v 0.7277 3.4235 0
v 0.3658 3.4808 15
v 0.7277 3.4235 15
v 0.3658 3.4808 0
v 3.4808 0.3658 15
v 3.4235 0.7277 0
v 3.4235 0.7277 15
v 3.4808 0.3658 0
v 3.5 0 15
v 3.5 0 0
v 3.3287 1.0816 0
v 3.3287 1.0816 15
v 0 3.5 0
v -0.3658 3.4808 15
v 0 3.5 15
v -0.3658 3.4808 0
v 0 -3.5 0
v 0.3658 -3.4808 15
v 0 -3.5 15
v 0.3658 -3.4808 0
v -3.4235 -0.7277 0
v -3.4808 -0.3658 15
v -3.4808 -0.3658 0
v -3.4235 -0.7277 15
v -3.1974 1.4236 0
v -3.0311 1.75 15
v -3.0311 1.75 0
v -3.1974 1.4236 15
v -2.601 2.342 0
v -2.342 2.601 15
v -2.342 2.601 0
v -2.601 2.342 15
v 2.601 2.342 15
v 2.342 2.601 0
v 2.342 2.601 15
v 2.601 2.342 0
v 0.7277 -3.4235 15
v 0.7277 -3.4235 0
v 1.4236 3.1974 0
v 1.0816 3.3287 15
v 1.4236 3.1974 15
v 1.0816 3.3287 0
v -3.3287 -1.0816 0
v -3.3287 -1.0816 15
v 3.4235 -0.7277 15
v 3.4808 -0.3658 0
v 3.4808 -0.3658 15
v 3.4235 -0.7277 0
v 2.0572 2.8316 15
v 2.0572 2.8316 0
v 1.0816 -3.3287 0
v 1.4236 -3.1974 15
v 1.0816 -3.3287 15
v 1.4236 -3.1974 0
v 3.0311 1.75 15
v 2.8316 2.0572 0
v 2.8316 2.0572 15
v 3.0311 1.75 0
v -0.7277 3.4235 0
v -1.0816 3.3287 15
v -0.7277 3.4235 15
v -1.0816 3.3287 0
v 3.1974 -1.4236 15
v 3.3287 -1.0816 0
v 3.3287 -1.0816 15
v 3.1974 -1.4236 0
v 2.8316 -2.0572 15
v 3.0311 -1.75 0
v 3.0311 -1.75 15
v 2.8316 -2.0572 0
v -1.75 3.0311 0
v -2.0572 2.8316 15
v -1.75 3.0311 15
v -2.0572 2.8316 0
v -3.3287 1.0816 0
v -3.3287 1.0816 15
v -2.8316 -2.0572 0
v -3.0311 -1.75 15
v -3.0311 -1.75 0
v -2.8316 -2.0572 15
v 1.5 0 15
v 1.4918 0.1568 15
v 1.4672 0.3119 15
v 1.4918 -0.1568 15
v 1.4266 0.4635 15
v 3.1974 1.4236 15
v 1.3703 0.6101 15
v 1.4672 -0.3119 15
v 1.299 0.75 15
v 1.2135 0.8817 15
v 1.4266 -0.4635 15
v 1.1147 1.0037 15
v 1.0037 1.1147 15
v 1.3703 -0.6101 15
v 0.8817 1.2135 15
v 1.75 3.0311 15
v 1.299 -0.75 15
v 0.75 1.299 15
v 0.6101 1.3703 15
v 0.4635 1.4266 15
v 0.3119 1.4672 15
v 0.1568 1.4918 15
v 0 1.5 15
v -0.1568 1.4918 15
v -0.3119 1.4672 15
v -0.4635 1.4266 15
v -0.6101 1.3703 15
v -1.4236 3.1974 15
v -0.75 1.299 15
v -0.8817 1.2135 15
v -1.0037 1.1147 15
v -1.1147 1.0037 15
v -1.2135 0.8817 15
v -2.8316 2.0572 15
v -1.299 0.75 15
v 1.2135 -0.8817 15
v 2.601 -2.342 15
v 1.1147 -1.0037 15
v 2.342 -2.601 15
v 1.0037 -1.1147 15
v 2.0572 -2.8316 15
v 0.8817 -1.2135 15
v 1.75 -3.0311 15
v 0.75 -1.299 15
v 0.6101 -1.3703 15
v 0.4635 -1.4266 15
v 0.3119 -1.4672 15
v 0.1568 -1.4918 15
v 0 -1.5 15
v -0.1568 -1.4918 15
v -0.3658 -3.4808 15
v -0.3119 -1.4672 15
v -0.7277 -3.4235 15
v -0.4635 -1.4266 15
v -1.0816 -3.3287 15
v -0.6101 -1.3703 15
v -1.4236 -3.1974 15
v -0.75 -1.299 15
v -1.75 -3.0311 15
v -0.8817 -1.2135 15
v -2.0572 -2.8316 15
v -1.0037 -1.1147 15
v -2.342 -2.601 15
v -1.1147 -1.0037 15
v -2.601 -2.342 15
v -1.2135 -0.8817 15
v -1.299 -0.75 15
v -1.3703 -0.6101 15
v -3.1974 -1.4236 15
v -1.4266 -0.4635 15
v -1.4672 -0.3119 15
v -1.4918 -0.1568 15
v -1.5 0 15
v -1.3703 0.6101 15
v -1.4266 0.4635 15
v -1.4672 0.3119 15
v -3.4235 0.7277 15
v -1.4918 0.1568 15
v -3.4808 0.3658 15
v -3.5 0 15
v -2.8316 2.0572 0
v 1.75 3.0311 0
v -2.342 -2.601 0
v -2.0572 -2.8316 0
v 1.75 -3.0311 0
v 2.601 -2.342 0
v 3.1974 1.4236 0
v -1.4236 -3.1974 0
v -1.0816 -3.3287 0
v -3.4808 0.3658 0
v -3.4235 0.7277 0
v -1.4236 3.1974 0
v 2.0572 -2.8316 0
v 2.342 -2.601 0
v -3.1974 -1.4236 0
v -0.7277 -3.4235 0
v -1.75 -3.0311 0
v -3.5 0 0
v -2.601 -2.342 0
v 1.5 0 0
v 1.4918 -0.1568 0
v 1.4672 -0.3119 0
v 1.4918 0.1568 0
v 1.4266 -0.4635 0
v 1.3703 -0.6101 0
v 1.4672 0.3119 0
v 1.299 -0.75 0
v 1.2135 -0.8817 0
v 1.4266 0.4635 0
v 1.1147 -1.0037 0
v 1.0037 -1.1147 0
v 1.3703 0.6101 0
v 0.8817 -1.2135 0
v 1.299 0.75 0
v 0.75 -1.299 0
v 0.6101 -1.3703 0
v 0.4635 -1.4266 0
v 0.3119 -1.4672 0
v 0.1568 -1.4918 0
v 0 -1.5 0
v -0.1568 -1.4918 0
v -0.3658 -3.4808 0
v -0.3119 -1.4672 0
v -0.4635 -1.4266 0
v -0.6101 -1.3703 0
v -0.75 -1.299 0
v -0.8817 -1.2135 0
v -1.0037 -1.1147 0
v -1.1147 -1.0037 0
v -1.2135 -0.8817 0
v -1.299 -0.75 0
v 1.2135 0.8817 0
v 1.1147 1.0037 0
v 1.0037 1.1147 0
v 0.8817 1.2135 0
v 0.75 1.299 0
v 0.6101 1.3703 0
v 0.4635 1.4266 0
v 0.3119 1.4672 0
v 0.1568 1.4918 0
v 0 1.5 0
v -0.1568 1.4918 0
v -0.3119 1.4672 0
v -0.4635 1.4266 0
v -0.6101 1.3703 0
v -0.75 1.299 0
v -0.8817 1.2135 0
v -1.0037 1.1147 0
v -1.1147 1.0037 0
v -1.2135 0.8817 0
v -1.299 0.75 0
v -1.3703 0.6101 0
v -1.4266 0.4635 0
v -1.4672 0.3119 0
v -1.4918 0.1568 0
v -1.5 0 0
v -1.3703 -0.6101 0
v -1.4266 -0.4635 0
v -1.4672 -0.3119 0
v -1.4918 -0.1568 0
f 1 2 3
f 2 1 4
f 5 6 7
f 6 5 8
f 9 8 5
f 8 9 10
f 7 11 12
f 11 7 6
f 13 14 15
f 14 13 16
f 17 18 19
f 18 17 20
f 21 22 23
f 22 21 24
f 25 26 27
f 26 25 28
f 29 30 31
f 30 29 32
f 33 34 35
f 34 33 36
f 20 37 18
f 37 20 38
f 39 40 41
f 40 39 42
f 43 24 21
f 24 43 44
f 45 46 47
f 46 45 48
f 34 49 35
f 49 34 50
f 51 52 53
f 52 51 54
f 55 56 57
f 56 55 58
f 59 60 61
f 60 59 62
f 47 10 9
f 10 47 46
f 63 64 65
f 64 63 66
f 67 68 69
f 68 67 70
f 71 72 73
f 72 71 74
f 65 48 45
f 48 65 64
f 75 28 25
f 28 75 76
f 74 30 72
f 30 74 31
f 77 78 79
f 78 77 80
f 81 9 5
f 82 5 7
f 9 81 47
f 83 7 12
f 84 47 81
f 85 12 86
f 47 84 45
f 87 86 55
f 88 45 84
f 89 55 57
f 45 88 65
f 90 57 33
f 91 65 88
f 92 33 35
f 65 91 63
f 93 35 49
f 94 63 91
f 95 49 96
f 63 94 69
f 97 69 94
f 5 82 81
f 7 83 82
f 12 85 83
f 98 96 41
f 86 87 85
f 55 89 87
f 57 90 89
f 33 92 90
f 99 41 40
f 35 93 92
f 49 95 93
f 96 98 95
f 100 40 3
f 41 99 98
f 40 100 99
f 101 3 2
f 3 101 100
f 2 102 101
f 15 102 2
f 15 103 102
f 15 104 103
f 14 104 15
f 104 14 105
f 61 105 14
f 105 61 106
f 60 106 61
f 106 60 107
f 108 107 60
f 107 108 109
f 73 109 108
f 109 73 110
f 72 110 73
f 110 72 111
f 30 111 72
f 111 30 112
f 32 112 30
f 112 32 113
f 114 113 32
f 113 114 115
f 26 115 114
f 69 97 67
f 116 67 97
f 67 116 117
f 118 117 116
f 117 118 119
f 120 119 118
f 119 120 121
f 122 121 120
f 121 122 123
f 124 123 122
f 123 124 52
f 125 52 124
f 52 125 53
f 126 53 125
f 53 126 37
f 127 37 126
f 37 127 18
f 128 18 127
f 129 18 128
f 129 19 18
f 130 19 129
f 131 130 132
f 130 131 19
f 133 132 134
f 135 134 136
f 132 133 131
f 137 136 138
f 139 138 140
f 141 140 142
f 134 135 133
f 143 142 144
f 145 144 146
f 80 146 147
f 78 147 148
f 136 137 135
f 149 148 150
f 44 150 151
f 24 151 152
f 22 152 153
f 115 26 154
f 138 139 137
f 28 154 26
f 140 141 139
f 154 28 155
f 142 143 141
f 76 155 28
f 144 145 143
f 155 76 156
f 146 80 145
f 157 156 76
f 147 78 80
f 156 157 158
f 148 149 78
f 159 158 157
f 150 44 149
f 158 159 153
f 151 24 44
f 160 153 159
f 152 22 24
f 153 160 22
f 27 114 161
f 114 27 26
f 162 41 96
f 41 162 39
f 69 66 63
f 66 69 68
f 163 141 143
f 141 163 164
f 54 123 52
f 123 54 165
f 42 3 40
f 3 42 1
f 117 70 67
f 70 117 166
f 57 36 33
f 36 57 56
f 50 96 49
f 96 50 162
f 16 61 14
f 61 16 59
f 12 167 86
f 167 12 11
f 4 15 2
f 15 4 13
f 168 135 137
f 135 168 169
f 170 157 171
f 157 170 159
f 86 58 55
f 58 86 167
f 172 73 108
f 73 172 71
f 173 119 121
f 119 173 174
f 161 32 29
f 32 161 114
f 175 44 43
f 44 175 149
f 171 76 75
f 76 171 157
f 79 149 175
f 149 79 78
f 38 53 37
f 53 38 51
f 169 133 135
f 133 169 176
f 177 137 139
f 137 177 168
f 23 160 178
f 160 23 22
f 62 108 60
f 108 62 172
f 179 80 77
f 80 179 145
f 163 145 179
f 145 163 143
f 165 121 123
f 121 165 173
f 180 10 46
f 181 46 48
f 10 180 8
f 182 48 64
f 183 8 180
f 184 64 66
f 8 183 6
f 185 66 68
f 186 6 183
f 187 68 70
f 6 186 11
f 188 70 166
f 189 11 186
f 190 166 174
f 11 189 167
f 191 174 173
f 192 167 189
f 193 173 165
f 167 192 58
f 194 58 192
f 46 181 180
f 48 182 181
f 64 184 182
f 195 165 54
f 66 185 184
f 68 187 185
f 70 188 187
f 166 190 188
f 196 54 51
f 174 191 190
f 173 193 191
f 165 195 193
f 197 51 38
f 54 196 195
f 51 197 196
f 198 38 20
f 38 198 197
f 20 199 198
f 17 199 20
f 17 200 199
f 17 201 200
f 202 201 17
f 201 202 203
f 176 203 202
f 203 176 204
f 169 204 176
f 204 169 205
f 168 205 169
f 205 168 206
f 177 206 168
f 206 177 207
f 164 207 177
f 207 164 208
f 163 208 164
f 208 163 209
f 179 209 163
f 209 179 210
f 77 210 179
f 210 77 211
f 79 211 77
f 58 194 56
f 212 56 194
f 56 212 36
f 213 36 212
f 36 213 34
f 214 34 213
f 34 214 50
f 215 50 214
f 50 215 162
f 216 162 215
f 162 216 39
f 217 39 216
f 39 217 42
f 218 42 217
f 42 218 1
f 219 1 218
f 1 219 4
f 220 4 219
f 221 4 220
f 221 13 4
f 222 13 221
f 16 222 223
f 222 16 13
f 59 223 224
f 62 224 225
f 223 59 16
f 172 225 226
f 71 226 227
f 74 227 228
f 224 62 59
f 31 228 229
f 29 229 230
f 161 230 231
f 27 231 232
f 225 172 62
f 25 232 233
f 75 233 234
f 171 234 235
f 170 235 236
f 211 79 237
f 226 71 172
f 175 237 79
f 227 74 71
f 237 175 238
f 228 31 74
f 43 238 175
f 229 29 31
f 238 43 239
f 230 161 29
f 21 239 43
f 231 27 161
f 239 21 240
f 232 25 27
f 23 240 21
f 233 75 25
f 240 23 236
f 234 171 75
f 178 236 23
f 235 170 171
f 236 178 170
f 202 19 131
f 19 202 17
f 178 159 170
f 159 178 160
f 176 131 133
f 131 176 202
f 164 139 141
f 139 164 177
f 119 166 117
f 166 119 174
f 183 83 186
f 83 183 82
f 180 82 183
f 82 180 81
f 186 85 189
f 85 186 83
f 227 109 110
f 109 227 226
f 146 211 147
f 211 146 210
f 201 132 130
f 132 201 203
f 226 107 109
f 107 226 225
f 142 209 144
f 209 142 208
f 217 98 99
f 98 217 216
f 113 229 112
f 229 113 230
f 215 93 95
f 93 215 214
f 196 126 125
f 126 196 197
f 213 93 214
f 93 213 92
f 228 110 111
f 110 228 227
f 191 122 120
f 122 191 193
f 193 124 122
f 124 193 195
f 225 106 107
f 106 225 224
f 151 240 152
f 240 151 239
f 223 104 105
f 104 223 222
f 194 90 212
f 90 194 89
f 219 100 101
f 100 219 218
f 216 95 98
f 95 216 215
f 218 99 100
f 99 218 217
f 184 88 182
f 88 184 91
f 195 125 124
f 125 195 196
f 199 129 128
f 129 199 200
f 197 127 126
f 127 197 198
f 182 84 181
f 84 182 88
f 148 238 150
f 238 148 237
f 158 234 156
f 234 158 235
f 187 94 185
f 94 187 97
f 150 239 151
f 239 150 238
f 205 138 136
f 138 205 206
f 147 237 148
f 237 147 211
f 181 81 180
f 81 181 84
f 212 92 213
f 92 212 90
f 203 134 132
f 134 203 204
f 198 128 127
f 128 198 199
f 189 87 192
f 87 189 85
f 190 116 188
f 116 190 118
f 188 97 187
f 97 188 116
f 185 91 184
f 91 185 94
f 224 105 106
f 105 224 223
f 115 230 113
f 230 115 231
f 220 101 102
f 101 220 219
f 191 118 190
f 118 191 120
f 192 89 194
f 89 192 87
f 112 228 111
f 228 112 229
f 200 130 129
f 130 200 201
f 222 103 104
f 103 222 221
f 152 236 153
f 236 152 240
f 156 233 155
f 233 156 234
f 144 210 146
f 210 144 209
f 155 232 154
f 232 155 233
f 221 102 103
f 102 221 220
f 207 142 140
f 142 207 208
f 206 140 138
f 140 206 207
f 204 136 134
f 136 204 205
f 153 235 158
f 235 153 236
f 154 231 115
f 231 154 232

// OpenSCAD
/**
 * Copyright (c) 2026 Mortara Limited
 * Daniel Mortara <daniel.mortara@gmail.com>
 * 2026-07-10
 *
 * A simple jig to test the magnet sensor range.
 * A holow cylinder in the z axis holding the sensor
 * A holow bigger cylinder in the z axis which holds the magnets on the Y axis 
 * symetrically appart from the senso 
 */ 


//render_part = "all";
//render_part = "magnet_carrier";
render_part = "sensor_carrier";

// --- Sensor package dimensions (ALS31001LUAA) ---
sensor_z_sz = 4.0; // In mm
sensor_x_sz = 3.0;
sensor_y_sz = 1.5;

// --- magnets size (a cylinder)---
magnet_radius = 3.0; // mm
magnet_height = 3.0; // mm


// Sizes for the sensor carrier
sensor_carrier_inner_radius = sensor_x_sz/2.0;
sensor_carrier_outer_radius = sensor_x_sz/2.0+2.0;

// Size of magnet carrier
magnet_carrier_inner_radius = sensor_carrier_outer_radius+0.1;
magnet_carrier_outer_radius = sensor_carrier_outer_radius+0.1 + magnet_height + 2.0;
magnet_carrier_height = magnet_radius*2.0 + 4.0;

sensor_carrier_height = magnet_carrier_height+5.0;

$fn = 60;

/**
 * Sensor container (a small rod)
 */
module sensor_carrier() {
  difference() {
    cylinder(d=sensor_carrier_outer_radius*2.0, h= sensor_carrier_height);
    translate([0,0,-0.1])
    cylinder(d=sensor_carrier_inner_radius*2.0, h= sensor_carrier_height+0.2);
    //translate([0,0,2.0+sensor_z_sz])
    //cylinder(d=sensor_carrier_inner_radius*2.0+1, h= sensor_carrier_height+0.1);
  }
}

/**
 * magnets container (a small cilinder)
 * with a hole in the Z axis where the sensor will go
 * Another hole in the y axis orthogonal to the sensor hole to put two magnets
 */
module magnet_carrier() {
  difference() {
    // Shape here ...
    cylinder(d=magnet_carrier_outer_radius*2.0, h= magnet_carrier_height);
    translate([0, 0, -0.1]) // So the hole goes a bit beyon the botom of the magnet carrier
    cylinder(d=magnet_carrier_inner_radius*2.0, h= magnet_carrier_height+0.2);
    // ... minus all that follows after:
    // Magnets holes. 
    // Sequence is appyied in reverse order as with OpenGL
    translate([0, 0, magnet_radius+2.0])
    translate([0, magnet_carrier_outer_radius, 0])
    rotate([90,0,0])
    cylinder(d=magnet_radius*2.0,h=magnet_carrier_outer_radius*2.0);

    // Two sligly bigger holes to insert the magnet from the outside
    // with a small groom to kipt it in place
    groove = 0.2; // In mm for holding the manget
    for(i=[-1:2:1])
      translate([0, 0, magnet_radius+2.0])
      translate([0, i*(magnet_carrier_inner_radius+groove), 0])
      rotate([-i*90, 0, 0])
      cylinder(d=(magnet_radius+groove)*2.0,h=magnet_carrier_outer_radius - magnet_carrier_inner_radius );
  }
}

/**
 * Preview setup
 */
if (render_part == "sensor_carrier" || render_part == "all") {
  color("SteelBlue") sensor_carrier();
}
if (render_part == "magnet_carrier" || render_part == "all") {
  color("Coral") #magnet_carrier();
}
